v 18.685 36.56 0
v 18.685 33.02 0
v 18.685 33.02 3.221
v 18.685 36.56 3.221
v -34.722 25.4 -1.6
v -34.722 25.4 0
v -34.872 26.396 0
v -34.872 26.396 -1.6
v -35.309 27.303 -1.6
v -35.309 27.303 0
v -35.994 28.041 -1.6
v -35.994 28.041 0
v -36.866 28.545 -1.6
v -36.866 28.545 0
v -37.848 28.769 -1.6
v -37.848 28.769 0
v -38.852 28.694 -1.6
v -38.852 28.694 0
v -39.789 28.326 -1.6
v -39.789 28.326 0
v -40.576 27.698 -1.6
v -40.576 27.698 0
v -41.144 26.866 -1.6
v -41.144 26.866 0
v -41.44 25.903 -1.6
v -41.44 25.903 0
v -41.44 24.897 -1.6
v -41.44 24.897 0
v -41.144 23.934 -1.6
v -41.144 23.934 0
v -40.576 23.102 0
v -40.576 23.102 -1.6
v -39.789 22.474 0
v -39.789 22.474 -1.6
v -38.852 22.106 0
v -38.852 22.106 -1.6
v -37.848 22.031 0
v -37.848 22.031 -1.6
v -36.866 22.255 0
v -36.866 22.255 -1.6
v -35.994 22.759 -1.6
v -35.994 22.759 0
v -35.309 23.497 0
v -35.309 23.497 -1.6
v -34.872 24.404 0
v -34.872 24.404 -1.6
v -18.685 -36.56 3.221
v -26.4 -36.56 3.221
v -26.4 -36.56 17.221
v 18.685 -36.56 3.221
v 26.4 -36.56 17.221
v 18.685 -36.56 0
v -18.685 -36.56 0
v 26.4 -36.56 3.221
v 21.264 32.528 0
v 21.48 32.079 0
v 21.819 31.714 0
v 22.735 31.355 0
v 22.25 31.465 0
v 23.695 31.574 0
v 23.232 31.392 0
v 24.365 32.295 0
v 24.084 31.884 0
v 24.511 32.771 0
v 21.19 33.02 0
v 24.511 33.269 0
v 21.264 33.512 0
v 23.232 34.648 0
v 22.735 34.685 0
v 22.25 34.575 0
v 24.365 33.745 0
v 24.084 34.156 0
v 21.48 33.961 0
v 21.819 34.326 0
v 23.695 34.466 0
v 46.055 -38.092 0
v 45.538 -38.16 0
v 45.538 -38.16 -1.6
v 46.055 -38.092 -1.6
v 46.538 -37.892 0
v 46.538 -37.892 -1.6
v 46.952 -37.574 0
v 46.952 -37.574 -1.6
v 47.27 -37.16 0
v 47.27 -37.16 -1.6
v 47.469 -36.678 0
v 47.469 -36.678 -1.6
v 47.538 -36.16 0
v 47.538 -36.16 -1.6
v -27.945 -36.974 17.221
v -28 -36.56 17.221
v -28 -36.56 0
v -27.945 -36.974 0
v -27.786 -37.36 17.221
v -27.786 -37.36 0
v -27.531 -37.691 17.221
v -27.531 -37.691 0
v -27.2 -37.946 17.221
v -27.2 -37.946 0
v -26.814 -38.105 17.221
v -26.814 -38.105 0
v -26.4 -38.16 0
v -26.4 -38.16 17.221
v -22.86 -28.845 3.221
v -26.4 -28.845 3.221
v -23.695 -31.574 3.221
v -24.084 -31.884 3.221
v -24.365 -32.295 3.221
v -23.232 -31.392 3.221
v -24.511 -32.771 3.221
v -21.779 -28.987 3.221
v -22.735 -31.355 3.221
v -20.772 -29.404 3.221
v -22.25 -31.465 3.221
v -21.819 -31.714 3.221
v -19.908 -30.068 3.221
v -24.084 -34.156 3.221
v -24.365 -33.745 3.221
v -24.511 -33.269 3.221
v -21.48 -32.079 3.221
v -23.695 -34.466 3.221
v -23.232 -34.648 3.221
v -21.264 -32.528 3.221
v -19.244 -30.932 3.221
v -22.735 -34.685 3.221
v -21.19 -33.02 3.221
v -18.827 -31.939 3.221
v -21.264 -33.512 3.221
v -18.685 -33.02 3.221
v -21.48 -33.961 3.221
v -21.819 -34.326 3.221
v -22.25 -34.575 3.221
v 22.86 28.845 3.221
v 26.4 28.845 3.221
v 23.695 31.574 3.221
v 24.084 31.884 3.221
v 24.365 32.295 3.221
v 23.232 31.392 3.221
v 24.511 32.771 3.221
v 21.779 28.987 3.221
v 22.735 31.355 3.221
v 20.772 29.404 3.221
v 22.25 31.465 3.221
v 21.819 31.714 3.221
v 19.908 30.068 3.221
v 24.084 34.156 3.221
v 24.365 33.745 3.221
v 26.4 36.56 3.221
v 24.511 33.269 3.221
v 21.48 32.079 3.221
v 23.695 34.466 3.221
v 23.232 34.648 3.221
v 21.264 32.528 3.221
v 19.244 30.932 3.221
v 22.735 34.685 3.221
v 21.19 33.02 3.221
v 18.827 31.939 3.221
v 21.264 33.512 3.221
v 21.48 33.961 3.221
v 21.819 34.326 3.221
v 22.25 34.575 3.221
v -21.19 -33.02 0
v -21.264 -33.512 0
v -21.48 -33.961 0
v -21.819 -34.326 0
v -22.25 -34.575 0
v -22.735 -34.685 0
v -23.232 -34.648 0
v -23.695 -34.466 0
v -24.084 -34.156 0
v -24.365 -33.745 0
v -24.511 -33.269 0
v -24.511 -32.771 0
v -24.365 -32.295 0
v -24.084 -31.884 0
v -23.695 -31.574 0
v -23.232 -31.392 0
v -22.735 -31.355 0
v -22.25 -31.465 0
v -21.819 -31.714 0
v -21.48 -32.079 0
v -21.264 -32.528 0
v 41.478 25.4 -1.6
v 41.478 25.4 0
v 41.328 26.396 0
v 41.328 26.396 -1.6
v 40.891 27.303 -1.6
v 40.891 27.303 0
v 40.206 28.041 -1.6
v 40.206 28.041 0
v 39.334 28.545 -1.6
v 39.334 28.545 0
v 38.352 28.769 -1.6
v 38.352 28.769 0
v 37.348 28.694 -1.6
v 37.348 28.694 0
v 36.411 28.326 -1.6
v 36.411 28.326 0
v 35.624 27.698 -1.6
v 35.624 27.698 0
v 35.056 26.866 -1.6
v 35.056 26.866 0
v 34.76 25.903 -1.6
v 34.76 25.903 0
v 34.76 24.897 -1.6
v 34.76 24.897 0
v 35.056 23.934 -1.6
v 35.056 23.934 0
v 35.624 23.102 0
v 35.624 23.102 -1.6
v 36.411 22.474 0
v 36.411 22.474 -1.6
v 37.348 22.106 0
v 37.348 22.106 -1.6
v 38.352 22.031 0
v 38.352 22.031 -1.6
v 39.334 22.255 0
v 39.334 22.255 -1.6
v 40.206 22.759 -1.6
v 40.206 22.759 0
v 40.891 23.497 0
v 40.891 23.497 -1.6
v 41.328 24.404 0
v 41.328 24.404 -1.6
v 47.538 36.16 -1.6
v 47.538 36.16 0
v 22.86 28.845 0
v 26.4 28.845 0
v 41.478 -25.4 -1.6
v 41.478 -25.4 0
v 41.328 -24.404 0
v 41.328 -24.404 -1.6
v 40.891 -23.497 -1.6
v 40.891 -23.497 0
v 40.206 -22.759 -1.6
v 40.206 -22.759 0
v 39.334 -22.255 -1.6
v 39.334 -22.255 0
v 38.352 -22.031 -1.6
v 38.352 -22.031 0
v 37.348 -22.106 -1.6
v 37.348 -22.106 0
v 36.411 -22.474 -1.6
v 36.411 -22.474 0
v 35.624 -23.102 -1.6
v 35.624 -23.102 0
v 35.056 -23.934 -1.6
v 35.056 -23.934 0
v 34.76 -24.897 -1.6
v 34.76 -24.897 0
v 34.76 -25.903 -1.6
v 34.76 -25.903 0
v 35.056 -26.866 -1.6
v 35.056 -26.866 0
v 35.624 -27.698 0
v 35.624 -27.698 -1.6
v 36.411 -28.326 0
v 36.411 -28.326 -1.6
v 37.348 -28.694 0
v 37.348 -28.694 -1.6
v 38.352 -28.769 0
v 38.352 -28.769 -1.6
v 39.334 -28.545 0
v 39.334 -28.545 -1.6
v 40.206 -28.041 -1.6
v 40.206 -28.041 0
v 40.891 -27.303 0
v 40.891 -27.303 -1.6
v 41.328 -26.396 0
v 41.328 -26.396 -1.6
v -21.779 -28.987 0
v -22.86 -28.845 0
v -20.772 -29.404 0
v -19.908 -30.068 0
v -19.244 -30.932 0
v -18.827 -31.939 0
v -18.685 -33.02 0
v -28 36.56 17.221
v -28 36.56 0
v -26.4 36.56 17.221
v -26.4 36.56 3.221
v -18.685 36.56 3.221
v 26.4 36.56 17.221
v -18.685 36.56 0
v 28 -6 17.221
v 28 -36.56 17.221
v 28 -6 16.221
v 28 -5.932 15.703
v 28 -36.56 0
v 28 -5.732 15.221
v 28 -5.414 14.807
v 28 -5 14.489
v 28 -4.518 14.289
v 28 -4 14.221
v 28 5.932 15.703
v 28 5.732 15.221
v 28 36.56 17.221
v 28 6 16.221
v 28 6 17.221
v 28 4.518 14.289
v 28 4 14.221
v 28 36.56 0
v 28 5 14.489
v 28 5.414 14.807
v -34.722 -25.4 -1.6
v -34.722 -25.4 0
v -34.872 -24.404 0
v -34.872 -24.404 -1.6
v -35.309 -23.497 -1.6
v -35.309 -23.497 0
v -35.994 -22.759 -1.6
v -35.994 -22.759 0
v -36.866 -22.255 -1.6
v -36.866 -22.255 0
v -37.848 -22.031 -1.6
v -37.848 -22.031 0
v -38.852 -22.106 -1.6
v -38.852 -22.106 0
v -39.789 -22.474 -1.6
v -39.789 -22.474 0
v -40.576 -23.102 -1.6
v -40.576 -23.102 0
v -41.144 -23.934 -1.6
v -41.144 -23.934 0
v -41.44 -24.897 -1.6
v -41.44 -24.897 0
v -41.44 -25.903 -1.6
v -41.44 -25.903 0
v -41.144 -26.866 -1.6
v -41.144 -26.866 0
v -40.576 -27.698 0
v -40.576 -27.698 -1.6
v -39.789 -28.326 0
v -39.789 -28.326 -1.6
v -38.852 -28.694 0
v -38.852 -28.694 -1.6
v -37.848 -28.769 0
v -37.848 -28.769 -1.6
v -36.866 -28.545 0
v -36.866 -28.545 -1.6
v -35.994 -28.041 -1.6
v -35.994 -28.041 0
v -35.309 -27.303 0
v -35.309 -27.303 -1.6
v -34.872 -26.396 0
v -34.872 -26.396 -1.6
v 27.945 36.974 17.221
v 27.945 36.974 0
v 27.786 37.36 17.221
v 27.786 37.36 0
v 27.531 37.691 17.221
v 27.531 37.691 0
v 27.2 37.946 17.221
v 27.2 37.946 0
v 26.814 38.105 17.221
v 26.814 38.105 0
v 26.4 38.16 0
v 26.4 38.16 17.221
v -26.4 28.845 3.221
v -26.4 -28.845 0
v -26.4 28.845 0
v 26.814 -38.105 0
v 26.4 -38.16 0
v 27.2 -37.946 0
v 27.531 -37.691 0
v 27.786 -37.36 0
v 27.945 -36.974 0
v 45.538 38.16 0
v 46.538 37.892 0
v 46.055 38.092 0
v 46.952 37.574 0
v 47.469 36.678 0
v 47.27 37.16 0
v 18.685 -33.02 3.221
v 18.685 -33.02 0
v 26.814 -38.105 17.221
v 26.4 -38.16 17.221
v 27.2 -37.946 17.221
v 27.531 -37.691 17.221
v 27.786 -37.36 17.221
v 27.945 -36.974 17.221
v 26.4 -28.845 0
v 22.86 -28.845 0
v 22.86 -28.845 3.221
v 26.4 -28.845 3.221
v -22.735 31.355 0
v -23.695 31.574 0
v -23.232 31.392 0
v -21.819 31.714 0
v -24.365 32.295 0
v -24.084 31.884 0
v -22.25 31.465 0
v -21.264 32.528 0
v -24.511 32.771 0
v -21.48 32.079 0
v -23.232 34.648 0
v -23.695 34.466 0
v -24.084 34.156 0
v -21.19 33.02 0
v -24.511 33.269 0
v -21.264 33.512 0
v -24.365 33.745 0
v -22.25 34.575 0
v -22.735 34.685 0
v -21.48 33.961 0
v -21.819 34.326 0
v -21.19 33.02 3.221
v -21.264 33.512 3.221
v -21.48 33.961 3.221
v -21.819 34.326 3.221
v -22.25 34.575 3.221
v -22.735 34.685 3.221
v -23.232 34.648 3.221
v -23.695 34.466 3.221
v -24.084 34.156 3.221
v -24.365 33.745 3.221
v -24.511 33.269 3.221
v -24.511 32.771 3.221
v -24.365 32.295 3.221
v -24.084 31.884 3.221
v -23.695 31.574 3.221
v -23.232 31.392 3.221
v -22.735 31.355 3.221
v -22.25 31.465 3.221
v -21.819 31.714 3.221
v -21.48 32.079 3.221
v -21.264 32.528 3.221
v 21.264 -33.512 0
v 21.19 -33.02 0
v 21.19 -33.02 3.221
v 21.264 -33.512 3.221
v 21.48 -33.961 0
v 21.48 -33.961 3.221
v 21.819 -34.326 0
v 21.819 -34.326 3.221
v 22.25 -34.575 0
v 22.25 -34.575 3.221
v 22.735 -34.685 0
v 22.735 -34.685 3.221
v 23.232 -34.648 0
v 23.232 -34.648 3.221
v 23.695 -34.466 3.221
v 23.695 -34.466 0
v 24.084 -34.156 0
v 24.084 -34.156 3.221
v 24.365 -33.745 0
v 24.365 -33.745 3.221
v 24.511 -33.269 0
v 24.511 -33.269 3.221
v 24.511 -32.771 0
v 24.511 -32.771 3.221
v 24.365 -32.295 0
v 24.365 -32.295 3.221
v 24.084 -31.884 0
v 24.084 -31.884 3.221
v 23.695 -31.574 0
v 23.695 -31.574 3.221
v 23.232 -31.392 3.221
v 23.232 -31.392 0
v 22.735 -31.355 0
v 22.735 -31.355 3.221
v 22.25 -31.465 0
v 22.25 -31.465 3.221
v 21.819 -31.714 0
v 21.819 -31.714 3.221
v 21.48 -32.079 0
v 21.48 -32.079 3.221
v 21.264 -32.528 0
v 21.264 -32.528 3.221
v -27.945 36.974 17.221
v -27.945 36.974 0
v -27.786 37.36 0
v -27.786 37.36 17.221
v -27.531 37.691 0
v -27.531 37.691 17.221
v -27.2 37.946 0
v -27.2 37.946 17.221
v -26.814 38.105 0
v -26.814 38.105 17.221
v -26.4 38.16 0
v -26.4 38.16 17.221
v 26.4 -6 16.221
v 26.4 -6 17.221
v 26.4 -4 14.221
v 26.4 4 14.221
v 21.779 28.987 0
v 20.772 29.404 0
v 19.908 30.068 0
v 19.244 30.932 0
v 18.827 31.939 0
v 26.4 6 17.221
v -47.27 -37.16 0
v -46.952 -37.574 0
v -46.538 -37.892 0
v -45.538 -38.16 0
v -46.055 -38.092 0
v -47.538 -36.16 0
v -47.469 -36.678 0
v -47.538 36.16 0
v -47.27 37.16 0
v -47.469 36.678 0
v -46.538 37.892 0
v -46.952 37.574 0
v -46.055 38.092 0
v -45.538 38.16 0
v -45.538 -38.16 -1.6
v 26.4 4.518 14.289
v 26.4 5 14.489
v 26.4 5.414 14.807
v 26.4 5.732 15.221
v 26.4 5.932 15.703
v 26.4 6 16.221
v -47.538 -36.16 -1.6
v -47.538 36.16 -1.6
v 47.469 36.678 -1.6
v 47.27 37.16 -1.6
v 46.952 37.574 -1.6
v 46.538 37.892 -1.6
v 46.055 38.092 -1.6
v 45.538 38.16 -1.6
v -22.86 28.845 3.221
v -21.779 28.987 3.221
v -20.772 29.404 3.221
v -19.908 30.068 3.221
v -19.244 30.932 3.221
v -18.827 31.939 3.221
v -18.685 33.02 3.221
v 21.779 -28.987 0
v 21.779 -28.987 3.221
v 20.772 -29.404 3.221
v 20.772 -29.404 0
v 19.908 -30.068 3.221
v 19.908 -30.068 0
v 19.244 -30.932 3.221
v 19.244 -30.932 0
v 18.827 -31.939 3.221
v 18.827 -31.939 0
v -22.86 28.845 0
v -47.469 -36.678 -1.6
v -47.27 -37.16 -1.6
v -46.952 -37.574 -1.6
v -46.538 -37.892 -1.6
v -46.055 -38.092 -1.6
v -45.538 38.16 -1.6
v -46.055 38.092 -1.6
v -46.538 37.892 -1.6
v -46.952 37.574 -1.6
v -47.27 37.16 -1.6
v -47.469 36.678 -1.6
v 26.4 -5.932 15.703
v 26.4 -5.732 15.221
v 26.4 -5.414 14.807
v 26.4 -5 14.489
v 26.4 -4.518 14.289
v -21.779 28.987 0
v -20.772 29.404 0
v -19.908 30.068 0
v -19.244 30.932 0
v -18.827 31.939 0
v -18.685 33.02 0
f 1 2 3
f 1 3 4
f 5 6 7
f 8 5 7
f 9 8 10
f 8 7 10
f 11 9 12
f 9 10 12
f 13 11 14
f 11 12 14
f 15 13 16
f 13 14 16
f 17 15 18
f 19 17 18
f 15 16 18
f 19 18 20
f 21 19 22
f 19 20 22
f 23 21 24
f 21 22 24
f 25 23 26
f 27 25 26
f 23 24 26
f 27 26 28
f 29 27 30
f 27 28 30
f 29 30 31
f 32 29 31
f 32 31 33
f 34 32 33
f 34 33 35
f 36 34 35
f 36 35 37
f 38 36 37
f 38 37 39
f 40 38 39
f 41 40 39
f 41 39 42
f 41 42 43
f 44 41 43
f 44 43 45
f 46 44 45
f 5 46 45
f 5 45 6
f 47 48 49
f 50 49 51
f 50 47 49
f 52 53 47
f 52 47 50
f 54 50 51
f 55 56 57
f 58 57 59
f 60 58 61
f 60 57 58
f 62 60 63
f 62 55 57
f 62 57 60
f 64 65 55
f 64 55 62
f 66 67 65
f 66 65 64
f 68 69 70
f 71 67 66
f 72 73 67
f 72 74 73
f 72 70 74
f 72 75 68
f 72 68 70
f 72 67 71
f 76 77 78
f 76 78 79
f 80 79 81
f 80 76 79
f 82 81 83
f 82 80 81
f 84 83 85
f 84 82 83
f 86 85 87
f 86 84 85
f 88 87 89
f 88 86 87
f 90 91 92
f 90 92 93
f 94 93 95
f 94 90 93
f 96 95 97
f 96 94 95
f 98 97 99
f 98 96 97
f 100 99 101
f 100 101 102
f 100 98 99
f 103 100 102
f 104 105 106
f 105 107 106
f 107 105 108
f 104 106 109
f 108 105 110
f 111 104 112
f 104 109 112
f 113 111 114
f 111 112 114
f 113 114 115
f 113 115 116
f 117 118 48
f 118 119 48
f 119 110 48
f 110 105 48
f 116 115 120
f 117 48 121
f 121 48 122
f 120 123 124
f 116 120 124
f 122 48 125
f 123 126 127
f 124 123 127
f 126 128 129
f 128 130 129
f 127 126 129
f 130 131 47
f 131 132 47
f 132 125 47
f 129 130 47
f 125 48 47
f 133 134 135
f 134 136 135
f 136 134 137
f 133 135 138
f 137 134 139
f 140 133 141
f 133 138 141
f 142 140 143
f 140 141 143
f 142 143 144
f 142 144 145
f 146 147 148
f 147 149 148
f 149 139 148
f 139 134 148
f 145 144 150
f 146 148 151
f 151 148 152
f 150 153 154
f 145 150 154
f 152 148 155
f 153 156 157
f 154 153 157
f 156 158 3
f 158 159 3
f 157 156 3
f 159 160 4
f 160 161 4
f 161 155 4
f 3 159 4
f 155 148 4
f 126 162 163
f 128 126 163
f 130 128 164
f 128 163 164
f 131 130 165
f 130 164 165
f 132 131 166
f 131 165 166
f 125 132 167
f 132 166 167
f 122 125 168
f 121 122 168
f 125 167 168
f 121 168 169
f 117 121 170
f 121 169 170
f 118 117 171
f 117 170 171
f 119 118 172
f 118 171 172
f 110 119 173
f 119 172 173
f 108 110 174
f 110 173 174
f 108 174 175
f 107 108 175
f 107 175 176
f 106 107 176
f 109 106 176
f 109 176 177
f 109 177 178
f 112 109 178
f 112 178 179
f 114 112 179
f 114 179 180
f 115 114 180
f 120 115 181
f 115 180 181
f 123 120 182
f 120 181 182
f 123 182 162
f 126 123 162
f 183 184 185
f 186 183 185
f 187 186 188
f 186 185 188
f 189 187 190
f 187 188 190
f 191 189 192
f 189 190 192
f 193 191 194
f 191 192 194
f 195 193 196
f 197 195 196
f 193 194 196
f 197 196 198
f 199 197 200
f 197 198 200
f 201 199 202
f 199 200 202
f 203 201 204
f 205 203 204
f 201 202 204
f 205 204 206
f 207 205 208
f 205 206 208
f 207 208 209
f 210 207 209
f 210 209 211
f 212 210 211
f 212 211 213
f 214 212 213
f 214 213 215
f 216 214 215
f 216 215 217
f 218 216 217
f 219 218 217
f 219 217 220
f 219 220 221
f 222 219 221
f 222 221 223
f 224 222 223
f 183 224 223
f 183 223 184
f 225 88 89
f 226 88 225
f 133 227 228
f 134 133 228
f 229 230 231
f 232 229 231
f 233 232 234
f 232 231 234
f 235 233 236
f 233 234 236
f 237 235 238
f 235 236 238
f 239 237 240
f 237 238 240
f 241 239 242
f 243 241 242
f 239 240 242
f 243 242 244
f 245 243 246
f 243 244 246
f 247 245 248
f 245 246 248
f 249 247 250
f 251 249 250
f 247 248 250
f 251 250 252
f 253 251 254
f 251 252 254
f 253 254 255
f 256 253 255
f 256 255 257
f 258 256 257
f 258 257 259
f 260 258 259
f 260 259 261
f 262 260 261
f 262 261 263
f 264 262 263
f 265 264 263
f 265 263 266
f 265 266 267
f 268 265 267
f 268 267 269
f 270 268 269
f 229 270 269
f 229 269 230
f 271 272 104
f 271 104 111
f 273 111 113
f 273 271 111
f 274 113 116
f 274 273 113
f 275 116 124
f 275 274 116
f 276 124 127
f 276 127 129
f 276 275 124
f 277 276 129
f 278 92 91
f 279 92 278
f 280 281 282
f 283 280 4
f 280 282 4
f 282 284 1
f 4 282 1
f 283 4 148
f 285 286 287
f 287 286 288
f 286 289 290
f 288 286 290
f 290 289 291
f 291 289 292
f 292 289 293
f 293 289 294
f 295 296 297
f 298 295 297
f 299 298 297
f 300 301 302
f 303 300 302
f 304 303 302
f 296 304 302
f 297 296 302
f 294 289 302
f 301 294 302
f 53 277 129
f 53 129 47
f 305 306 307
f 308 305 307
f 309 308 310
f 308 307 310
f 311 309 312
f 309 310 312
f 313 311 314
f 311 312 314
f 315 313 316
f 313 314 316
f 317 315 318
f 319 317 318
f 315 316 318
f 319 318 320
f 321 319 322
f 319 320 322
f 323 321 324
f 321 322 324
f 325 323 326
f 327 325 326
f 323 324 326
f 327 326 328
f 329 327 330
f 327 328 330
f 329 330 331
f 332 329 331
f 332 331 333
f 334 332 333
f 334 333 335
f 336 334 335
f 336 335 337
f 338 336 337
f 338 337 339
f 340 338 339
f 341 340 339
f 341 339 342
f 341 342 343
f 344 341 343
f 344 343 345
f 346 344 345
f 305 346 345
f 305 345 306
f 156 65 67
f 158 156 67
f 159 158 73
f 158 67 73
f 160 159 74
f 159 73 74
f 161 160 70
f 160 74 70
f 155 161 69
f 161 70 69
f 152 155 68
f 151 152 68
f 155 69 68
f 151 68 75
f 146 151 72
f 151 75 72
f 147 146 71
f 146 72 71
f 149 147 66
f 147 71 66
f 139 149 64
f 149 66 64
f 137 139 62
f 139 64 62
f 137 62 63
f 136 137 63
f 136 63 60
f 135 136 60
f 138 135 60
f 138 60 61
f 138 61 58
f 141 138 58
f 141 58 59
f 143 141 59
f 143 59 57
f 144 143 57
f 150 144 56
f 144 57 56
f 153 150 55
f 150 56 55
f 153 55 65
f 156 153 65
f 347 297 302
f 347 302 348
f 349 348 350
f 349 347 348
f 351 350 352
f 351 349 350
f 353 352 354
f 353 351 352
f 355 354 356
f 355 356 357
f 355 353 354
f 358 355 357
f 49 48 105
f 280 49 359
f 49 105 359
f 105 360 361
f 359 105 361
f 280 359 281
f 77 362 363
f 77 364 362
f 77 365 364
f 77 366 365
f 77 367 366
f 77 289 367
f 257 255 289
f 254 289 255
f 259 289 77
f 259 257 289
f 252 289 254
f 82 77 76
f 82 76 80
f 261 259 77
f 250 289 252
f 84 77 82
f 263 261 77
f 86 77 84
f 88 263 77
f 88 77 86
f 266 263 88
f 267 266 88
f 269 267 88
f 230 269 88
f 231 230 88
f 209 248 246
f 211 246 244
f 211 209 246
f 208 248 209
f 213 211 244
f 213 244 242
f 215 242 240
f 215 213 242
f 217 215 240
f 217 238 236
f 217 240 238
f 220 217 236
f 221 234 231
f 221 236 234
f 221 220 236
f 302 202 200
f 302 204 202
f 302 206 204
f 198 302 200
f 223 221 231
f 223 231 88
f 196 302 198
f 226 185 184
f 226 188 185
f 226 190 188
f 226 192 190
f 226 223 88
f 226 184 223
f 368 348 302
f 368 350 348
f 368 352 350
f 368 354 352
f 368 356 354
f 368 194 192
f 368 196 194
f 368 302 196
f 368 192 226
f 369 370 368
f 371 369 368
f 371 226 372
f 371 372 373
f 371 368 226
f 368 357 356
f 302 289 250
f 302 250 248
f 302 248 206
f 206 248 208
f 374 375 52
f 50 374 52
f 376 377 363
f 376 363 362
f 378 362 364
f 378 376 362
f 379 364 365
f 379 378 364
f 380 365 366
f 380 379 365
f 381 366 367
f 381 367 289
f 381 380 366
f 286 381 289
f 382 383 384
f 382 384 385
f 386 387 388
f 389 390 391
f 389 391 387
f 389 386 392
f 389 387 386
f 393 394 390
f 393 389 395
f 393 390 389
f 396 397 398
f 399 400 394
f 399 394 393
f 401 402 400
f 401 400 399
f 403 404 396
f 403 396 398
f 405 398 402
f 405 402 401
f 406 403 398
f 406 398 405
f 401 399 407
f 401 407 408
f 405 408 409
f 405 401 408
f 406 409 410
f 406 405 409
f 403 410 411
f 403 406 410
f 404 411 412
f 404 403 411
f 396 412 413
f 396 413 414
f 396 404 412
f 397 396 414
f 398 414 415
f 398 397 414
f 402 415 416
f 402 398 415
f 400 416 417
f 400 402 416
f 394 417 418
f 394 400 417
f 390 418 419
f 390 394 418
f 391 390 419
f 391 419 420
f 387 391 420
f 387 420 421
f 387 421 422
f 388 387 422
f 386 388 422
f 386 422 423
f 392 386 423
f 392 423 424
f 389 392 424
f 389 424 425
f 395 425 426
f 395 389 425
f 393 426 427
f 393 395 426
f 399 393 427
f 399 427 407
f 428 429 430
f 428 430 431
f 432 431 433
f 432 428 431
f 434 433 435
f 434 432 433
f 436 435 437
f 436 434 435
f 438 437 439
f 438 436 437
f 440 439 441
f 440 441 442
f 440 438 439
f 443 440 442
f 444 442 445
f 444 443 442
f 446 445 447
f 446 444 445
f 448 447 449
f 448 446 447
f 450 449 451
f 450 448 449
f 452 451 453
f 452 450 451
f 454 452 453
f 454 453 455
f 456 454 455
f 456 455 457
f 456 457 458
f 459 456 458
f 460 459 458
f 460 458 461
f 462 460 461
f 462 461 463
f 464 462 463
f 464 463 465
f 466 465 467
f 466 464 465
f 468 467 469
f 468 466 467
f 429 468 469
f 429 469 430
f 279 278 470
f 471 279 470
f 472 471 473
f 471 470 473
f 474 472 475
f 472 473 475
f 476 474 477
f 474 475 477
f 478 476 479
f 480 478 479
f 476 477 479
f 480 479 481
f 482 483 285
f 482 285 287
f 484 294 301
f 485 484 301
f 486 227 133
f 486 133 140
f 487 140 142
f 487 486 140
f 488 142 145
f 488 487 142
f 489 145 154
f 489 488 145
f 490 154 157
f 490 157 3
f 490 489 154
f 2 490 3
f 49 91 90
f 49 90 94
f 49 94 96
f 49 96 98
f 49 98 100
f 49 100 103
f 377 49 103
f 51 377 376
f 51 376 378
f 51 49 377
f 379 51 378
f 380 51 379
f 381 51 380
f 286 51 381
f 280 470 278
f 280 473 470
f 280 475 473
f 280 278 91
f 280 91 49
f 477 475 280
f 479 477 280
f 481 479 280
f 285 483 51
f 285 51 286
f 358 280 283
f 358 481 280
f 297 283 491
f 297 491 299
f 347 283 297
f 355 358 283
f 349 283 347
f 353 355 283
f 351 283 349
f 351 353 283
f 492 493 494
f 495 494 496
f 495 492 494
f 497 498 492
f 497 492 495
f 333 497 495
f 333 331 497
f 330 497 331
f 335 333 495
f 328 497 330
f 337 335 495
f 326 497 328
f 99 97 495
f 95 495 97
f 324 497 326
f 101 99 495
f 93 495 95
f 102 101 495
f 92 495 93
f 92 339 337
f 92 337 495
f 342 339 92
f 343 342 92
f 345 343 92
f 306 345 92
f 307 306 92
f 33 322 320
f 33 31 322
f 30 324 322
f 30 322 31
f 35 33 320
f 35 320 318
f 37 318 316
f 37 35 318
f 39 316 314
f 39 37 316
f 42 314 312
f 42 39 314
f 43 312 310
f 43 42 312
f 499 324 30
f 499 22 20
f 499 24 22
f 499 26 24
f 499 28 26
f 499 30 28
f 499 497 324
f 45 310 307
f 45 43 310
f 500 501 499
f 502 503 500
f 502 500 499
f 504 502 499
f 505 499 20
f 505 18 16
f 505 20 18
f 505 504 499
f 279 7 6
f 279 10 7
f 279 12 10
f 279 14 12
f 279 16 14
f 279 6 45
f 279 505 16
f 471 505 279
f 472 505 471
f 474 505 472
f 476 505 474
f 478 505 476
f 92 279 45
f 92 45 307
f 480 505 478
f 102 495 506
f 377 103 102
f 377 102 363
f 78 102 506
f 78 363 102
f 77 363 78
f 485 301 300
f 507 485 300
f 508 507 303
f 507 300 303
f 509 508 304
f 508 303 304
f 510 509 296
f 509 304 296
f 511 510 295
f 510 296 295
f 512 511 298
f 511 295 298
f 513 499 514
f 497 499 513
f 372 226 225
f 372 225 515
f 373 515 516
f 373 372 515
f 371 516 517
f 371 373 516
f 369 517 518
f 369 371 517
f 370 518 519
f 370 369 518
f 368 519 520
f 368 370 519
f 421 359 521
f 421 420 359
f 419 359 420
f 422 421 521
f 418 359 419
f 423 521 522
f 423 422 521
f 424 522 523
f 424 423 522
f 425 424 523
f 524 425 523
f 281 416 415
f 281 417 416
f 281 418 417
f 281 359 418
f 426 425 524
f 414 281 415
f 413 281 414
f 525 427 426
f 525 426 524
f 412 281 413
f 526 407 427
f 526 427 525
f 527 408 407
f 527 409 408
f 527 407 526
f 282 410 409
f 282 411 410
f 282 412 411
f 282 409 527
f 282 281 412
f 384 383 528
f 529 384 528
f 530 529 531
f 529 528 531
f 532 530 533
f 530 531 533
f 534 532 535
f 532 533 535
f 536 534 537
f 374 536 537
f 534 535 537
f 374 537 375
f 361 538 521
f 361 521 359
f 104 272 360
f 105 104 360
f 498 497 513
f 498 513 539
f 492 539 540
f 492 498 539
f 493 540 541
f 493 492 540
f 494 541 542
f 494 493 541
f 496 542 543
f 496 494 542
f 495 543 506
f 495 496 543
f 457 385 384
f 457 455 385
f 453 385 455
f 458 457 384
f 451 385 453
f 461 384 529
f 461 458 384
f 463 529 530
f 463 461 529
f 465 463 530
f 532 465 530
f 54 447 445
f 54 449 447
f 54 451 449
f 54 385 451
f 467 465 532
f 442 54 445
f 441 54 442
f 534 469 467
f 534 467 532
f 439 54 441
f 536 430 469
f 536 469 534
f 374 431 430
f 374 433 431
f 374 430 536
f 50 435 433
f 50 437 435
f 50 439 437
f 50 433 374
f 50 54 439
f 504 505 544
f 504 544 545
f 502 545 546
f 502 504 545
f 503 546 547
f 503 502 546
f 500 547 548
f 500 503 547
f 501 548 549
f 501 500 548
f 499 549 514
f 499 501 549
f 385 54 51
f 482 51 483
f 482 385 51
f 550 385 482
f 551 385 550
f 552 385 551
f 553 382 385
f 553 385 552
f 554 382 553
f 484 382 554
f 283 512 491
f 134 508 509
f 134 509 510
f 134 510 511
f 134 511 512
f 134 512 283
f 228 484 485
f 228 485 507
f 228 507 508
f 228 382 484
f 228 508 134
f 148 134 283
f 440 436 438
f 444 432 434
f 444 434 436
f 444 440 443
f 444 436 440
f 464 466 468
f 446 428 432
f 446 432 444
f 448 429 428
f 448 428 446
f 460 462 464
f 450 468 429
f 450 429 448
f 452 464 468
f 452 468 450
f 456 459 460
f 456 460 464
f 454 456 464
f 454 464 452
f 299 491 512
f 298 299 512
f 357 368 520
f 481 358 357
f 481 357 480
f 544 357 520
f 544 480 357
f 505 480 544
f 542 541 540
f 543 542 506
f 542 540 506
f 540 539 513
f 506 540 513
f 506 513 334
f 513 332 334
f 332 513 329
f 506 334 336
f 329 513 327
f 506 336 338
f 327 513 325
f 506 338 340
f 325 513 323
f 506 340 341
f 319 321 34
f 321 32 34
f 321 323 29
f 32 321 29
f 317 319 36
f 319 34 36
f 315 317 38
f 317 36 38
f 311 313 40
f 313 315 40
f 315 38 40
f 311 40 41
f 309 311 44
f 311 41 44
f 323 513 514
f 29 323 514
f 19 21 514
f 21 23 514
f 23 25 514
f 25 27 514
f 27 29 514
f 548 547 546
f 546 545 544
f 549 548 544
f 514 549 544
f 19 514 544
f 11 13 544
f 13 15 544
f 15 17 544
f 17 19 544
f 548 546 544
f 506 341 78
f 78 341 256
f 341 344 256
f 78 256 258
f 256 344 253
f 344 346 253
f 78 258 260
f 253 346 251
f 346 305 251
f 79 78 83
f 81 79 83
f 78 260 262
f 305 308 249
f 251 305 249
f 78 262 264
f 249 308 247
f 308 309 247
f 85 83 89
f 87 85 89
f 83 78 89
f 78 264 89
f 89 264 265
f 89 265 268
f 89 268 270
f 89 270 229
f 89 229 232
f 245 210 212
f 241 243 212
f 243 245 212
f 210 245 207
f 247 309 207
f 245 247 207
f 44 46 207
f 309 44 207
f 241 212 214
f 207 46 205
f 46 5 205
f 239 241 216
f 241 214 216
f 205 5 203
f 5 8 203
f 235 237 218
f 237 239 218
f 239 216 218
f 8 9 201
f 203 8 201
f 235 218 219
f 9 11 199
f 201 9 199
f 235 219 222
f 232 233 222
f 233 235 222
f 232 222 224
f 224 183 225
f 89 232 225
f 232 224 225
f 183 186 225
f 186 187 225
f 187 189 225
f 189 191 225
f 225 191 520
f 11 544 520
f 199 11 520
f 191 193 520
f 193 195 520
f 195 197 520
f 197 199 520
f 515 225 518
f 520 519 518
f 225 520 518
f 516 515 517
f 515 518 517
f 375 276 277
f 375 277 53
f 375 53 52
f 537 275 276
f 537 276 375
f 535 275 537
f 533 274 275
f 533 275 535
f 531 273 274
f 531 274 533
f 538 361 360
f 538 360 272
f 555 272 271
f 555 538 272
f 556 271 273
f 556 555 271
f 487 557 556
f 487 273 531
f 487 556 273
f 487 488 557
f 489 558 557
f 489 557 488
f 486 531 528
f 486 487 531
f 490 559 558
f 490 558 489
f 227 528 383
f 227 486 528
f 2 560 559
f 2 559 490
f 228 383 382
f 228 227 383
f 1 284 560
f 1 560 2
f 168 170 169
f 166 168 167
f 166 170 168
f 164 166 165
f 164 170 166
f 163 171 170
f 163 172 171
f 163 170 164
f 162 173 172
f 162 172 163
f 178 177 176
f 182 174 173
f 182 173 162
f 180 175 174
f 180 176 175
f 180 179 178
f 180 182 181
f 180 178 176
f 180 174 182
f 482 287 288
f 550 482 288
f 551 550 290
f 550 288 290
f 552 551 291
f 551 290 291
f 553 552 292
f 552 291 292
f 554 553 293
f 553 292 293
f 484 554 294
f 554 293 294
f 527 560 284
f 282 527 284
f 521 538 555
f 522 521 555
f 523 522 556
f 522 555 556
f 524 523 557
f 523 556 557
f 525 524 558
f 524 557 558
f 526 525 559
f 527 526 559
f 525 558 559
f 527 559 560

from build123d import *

# Parameters (mm, degrees)
SKETCH_W                = 52.8
SKETCH_H                = 73.12
PAD_DEPTH               = 17.221
THICKNESS_T             = 1.6
SKETCH001_R             = 1.67005
PAD001_DEPTH            = 3.221
SKETCH001_MIRRORED_2_R  = 1.67005
PAD001_MIRRORED_2_DEPTH = 3.221
PAD002_DEPTH            = 1.6
SKETCH003_R             = 3.3782
POCKET_DEPTH            = 1.601
POCKET001_DEPTH         = 1.6


with BuildPart() as part:
    # Sketch → Pad (new body)
    with BuildSketch(Plane.XY):
        Rectangle(SKETCH_W, SKETCH_H)
    extrude(amount=PAD_DEPTH)

    # Thickness
    thickness_openings = [part.faces().sort_by_distance(p)[0] for p in [
        (0, 0, 17.221),
    ]]
    offset(amount=THICKNESS_T, openings=thickness_openings)

    # Sketch001 → Pad001 (join)
    with BuildSketch(Plane.XY):
        with BuildLine():
            ThreePointArc((-22.86, 28.844875), (-19.907741, 30.067741), (-18.684875, 33.02))
            Line((-18.684875, 33.02), (-18.684875, 36.56))
            Line((-26.4, 36.56), (-18.684875, 36.56))
            Line((-26.4, 28.844875), (-26.4, 36.56))
            Line((-22.86, 28.844875), (-26.4, 28.844875))
        make_face()
        with Locations((-22.86, 33.02)):
            Circle(SKETCH001_R, mode=Mode.SUBTRACT)
    pad001 = extrude(amount=PAD001_DEPTH)

    # Sketch001 Mirrored 2 → Pad001 Mirrored 2 (add)
    with BuildSketch(Plane(origin=(0, 0, 0), x_dir=(-1, 0, 0), z_dir=(0, 0, -1))):
        with BuildLine():
            ThreePointArc((-22.86, 28.844875), (-19.907741, 30.067741), (-18.684875, 33.02))
            Line((-18.684875, 33.02), (-18.684875, 36.56))
            Line((-26.4, 36.56), (-18.684875, 36.56))
            Line((-26.4, 28.844875), (-26.4, 36.56))
            Line((-22.86, 28.844875), (-26.4, 28.844875))
        make_face()
        with Locations((-22.86, 33.02)):
            Circle(SKETCH001_MIRRORED_2_R, mode=Mode.SUBTRACT)
    pad001_mirrored_2 = extrude(amount=-PAD001_MIRRORED_2_DEPTH)

    # Mirrored001: Pad001, Pad001 Mirrored 2 across XZ
    add(pad001.mirror(Plane.XZ))
    add(pad001_mirrored_2.mirror(Plane.XZ))

    # Sketch002 → Pad002 (join)
    with BuildSketch(Plane.XY):
        with BuildLine():
            Line((-47.5375, 36.16), (-47.5375, -36.16))
            ThreePointArc((-47.5375, -36.16), (-46.951714, -37.574214), (-45.5375, -38.16))
            Line((-45.5375, -38.16), (45.5375, -38.16))
            ThreePointArc((45.5375, -38.16), (46.951714, -37.574214), (47.5375, -36.16))
            Line((47.5375, -36.16), (47.5375, 36.16))
            ThreePointArc((47.5375, 36.16), (46.951714, 37.574214), (45.5375, 38.16))
            Line((45.5375, 38.16), (-45.5375, 38.16))
            ThreePointArc((-45.5375, 38.16), (-46.951714, 37.574214), (-47.5375, 36.16))
        make_face()
    extrude(amount=-PAD002_DEPTH)

    # Sketch003 → Pocket (cut, through all)
    with BuildSketch(Plane.XY):
        with Locations((-38.1, 25.4)):
            Circle(SKETCH003_R)
        with Locations((38.1, 25.4)):
            Circle(SKETCH003_R)
        with Locations((-38.1, -25.4)):
            Circle(SKETCH003_R)
        with Locations((38.1, -25.4)):
            Circle(SKETCH003_R)
    extrude(amount=-POCKET_DEPTH, mode=Mode.SUBTRACT)

    # Sketch004 (on DatumPlane) → Pocket001 (cut)
    with BuildSketch(Plane.YZ.offset(28)):
        with BuildLine():
            Line((-6, 17.221), (6, 17.221))
            Line((6, 17.221), (6, 16.221))
            ThreePointArc((4, 14.221), (5.414214, 14.806786), (6, 16.221))
            Line((-4, 14.221), (4, 14.221))
            ThreePointArc((-6, 16.221), (-5.414214, 14.806786), (-4, 14.221))
            Line((-6, 17.221), (-6, 16.221))
        make_face()
    extrude(amount=-POCKET001_DEPTH, mode=Mode.SUBTRACT)


solid = part.part
